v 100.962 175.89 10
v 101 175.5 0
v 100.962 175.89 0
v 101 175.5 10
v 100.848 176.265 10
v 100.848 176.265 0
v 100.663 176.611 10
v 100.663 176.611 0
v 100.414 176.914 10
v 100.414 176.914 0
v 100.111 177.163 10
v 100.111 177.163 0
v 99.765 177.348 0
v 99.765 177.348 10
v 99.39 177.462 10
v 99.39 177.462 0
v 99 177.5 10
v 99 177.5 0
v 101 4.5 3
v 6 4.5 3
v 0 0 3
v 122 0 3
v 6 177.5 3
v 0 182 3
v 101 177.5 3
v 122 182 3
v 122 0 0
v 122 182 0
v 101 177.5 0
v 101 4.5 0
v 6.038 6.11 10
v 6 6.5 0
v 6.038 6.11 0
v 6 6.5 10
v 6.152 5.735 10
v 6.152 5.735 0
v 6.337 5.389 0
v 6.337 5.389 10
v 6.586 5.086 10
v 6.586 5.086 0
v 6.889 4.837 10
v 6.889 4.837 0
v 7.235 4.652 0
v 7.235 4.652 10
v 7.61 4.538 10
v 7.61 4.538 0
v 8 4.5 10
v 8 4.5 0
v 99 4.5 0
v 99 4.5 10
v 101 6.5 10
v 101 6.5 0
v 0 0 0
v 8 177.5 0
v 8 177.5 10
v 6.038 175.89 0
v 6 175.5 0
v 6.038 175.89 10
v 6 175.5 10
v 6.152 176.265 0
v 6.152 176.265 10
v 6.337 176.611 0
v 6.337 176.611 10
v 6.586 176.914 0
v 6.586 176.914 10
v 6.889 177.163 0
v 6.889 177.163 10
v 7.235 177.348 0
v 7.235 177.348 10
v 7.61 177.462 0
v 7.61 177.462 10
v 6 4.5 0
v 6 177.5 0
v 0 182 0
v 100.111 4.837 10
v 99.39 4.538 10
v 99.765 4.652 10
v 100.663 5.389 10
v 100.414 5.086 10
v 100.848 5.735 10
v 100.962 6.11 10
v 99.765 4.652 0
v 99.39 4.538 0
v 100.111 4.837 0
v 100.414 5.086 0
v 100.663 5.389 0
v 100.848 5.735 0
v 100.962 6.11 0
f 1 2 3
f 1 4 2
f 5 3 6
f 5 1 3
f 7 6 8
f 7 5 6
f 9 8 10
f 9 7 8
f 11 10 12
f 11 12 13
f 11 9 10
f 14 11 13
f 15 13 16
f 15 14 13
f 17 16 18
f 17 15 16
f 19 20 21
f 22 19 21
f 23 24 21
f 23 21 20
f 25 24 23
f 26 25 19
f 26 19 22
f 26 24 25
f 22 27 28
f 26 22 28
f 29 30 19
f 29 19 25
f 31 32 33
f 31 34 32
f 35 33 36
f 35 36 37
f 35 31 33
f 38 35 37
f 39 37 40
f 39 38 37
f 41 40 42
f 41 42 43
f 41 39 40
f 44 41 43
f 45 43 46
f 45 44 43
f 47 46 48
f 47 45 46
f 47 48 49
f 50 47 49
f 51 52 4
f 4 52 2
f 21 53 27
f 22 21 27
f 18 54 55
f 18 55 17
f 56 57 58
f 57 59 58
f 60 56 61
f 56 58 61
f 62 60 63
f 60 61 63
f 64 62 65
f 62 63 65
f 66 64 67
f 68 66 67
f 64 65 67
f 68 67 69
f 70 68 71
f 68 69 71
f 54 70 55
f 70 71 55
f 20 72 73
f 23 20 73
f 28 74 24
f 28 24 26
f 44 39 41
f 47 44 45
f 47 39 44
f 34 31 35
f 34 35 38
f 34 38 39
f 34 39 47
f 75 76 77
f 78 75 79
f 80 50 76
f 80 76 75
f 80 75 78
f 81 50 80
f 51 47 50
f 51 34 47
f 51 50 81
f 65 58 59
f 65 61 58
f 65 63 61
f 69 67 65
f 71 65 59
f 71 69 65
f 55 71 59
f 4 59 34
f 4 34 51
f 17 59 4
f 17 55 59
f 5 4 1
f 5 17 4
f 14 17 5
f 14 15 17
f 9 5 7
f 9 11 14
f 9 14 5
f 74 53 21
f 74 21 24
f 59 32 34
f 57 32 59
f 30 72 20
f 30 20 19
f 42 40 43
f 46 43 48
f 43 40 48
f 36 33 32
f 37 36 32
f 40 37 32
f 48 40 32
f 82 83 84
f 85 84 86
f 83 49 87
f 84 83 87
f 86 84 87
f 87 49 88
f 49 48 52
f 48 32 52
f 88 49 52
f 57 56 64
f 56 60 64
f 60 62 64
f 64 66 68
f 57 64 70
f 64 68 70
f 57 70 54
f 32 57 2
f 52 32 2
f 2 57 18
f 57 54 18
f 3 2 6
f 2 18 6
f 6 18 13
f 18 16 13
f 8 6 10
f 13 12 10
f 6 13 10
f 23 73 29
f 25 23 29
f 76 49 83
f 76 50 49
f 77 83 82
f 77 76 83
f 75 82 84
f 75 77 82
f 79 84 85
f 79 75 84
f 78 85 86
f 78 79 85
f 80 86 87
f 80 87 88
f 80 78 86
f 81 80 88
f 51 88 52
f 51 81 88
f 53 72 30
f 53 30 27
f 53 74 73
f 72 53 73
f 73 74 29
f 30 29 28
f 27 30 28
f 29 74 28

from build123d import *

# Parameters (mm, degrees)
BOX001_W     = 95
BOX001_H     = 173
BOX001_DEPTH = 10
BOX_W        = 122
BOX_H        = 182
BOX_DEPTH    = 3
FILLET_R     = 2


with BuildPart() as cube001:
    # Box001 → Box001 (new body)
    with BuildSketch(Plane(origin=(6, 4.5, 0), x_dir=(1, 0, 0), z_dir=(0, 0, 1))):
        with Locations((47.5, 86.5)):
            Rectangle(BOX001_W, BOX001_H)
    extrude(amount=BOX001_DEPTH)


with BuildPart() as cut:
    # Box → Box (new body)
    with BuildSketch(Plane.XY):
        with Locations((61, 91)):
            Rectangle(BOX_W, BOX_H)
    extrude(amount=BOX_DEPTH)

    # Cut: cut Cube001
    add(cube001.part, mode=Mode.SUBTRACT)


with BuildPart() as fillet_body:
    # Fillet base: copy of Cube001
    add(cube001.part)

    # Fillet
    fillet_edges = [fillet_body.edges().sort_by_distance(p)[0] for p in [
        (6, 4.5, 5),
        (6, 177.5, 5),
        (101, 4.5, 5),
        (101, 177.5, 5),
    ]]
    fillet(fillet_edges, radius=FILLET_R)


solid = Compound([cut.part, fillet_body.part])
